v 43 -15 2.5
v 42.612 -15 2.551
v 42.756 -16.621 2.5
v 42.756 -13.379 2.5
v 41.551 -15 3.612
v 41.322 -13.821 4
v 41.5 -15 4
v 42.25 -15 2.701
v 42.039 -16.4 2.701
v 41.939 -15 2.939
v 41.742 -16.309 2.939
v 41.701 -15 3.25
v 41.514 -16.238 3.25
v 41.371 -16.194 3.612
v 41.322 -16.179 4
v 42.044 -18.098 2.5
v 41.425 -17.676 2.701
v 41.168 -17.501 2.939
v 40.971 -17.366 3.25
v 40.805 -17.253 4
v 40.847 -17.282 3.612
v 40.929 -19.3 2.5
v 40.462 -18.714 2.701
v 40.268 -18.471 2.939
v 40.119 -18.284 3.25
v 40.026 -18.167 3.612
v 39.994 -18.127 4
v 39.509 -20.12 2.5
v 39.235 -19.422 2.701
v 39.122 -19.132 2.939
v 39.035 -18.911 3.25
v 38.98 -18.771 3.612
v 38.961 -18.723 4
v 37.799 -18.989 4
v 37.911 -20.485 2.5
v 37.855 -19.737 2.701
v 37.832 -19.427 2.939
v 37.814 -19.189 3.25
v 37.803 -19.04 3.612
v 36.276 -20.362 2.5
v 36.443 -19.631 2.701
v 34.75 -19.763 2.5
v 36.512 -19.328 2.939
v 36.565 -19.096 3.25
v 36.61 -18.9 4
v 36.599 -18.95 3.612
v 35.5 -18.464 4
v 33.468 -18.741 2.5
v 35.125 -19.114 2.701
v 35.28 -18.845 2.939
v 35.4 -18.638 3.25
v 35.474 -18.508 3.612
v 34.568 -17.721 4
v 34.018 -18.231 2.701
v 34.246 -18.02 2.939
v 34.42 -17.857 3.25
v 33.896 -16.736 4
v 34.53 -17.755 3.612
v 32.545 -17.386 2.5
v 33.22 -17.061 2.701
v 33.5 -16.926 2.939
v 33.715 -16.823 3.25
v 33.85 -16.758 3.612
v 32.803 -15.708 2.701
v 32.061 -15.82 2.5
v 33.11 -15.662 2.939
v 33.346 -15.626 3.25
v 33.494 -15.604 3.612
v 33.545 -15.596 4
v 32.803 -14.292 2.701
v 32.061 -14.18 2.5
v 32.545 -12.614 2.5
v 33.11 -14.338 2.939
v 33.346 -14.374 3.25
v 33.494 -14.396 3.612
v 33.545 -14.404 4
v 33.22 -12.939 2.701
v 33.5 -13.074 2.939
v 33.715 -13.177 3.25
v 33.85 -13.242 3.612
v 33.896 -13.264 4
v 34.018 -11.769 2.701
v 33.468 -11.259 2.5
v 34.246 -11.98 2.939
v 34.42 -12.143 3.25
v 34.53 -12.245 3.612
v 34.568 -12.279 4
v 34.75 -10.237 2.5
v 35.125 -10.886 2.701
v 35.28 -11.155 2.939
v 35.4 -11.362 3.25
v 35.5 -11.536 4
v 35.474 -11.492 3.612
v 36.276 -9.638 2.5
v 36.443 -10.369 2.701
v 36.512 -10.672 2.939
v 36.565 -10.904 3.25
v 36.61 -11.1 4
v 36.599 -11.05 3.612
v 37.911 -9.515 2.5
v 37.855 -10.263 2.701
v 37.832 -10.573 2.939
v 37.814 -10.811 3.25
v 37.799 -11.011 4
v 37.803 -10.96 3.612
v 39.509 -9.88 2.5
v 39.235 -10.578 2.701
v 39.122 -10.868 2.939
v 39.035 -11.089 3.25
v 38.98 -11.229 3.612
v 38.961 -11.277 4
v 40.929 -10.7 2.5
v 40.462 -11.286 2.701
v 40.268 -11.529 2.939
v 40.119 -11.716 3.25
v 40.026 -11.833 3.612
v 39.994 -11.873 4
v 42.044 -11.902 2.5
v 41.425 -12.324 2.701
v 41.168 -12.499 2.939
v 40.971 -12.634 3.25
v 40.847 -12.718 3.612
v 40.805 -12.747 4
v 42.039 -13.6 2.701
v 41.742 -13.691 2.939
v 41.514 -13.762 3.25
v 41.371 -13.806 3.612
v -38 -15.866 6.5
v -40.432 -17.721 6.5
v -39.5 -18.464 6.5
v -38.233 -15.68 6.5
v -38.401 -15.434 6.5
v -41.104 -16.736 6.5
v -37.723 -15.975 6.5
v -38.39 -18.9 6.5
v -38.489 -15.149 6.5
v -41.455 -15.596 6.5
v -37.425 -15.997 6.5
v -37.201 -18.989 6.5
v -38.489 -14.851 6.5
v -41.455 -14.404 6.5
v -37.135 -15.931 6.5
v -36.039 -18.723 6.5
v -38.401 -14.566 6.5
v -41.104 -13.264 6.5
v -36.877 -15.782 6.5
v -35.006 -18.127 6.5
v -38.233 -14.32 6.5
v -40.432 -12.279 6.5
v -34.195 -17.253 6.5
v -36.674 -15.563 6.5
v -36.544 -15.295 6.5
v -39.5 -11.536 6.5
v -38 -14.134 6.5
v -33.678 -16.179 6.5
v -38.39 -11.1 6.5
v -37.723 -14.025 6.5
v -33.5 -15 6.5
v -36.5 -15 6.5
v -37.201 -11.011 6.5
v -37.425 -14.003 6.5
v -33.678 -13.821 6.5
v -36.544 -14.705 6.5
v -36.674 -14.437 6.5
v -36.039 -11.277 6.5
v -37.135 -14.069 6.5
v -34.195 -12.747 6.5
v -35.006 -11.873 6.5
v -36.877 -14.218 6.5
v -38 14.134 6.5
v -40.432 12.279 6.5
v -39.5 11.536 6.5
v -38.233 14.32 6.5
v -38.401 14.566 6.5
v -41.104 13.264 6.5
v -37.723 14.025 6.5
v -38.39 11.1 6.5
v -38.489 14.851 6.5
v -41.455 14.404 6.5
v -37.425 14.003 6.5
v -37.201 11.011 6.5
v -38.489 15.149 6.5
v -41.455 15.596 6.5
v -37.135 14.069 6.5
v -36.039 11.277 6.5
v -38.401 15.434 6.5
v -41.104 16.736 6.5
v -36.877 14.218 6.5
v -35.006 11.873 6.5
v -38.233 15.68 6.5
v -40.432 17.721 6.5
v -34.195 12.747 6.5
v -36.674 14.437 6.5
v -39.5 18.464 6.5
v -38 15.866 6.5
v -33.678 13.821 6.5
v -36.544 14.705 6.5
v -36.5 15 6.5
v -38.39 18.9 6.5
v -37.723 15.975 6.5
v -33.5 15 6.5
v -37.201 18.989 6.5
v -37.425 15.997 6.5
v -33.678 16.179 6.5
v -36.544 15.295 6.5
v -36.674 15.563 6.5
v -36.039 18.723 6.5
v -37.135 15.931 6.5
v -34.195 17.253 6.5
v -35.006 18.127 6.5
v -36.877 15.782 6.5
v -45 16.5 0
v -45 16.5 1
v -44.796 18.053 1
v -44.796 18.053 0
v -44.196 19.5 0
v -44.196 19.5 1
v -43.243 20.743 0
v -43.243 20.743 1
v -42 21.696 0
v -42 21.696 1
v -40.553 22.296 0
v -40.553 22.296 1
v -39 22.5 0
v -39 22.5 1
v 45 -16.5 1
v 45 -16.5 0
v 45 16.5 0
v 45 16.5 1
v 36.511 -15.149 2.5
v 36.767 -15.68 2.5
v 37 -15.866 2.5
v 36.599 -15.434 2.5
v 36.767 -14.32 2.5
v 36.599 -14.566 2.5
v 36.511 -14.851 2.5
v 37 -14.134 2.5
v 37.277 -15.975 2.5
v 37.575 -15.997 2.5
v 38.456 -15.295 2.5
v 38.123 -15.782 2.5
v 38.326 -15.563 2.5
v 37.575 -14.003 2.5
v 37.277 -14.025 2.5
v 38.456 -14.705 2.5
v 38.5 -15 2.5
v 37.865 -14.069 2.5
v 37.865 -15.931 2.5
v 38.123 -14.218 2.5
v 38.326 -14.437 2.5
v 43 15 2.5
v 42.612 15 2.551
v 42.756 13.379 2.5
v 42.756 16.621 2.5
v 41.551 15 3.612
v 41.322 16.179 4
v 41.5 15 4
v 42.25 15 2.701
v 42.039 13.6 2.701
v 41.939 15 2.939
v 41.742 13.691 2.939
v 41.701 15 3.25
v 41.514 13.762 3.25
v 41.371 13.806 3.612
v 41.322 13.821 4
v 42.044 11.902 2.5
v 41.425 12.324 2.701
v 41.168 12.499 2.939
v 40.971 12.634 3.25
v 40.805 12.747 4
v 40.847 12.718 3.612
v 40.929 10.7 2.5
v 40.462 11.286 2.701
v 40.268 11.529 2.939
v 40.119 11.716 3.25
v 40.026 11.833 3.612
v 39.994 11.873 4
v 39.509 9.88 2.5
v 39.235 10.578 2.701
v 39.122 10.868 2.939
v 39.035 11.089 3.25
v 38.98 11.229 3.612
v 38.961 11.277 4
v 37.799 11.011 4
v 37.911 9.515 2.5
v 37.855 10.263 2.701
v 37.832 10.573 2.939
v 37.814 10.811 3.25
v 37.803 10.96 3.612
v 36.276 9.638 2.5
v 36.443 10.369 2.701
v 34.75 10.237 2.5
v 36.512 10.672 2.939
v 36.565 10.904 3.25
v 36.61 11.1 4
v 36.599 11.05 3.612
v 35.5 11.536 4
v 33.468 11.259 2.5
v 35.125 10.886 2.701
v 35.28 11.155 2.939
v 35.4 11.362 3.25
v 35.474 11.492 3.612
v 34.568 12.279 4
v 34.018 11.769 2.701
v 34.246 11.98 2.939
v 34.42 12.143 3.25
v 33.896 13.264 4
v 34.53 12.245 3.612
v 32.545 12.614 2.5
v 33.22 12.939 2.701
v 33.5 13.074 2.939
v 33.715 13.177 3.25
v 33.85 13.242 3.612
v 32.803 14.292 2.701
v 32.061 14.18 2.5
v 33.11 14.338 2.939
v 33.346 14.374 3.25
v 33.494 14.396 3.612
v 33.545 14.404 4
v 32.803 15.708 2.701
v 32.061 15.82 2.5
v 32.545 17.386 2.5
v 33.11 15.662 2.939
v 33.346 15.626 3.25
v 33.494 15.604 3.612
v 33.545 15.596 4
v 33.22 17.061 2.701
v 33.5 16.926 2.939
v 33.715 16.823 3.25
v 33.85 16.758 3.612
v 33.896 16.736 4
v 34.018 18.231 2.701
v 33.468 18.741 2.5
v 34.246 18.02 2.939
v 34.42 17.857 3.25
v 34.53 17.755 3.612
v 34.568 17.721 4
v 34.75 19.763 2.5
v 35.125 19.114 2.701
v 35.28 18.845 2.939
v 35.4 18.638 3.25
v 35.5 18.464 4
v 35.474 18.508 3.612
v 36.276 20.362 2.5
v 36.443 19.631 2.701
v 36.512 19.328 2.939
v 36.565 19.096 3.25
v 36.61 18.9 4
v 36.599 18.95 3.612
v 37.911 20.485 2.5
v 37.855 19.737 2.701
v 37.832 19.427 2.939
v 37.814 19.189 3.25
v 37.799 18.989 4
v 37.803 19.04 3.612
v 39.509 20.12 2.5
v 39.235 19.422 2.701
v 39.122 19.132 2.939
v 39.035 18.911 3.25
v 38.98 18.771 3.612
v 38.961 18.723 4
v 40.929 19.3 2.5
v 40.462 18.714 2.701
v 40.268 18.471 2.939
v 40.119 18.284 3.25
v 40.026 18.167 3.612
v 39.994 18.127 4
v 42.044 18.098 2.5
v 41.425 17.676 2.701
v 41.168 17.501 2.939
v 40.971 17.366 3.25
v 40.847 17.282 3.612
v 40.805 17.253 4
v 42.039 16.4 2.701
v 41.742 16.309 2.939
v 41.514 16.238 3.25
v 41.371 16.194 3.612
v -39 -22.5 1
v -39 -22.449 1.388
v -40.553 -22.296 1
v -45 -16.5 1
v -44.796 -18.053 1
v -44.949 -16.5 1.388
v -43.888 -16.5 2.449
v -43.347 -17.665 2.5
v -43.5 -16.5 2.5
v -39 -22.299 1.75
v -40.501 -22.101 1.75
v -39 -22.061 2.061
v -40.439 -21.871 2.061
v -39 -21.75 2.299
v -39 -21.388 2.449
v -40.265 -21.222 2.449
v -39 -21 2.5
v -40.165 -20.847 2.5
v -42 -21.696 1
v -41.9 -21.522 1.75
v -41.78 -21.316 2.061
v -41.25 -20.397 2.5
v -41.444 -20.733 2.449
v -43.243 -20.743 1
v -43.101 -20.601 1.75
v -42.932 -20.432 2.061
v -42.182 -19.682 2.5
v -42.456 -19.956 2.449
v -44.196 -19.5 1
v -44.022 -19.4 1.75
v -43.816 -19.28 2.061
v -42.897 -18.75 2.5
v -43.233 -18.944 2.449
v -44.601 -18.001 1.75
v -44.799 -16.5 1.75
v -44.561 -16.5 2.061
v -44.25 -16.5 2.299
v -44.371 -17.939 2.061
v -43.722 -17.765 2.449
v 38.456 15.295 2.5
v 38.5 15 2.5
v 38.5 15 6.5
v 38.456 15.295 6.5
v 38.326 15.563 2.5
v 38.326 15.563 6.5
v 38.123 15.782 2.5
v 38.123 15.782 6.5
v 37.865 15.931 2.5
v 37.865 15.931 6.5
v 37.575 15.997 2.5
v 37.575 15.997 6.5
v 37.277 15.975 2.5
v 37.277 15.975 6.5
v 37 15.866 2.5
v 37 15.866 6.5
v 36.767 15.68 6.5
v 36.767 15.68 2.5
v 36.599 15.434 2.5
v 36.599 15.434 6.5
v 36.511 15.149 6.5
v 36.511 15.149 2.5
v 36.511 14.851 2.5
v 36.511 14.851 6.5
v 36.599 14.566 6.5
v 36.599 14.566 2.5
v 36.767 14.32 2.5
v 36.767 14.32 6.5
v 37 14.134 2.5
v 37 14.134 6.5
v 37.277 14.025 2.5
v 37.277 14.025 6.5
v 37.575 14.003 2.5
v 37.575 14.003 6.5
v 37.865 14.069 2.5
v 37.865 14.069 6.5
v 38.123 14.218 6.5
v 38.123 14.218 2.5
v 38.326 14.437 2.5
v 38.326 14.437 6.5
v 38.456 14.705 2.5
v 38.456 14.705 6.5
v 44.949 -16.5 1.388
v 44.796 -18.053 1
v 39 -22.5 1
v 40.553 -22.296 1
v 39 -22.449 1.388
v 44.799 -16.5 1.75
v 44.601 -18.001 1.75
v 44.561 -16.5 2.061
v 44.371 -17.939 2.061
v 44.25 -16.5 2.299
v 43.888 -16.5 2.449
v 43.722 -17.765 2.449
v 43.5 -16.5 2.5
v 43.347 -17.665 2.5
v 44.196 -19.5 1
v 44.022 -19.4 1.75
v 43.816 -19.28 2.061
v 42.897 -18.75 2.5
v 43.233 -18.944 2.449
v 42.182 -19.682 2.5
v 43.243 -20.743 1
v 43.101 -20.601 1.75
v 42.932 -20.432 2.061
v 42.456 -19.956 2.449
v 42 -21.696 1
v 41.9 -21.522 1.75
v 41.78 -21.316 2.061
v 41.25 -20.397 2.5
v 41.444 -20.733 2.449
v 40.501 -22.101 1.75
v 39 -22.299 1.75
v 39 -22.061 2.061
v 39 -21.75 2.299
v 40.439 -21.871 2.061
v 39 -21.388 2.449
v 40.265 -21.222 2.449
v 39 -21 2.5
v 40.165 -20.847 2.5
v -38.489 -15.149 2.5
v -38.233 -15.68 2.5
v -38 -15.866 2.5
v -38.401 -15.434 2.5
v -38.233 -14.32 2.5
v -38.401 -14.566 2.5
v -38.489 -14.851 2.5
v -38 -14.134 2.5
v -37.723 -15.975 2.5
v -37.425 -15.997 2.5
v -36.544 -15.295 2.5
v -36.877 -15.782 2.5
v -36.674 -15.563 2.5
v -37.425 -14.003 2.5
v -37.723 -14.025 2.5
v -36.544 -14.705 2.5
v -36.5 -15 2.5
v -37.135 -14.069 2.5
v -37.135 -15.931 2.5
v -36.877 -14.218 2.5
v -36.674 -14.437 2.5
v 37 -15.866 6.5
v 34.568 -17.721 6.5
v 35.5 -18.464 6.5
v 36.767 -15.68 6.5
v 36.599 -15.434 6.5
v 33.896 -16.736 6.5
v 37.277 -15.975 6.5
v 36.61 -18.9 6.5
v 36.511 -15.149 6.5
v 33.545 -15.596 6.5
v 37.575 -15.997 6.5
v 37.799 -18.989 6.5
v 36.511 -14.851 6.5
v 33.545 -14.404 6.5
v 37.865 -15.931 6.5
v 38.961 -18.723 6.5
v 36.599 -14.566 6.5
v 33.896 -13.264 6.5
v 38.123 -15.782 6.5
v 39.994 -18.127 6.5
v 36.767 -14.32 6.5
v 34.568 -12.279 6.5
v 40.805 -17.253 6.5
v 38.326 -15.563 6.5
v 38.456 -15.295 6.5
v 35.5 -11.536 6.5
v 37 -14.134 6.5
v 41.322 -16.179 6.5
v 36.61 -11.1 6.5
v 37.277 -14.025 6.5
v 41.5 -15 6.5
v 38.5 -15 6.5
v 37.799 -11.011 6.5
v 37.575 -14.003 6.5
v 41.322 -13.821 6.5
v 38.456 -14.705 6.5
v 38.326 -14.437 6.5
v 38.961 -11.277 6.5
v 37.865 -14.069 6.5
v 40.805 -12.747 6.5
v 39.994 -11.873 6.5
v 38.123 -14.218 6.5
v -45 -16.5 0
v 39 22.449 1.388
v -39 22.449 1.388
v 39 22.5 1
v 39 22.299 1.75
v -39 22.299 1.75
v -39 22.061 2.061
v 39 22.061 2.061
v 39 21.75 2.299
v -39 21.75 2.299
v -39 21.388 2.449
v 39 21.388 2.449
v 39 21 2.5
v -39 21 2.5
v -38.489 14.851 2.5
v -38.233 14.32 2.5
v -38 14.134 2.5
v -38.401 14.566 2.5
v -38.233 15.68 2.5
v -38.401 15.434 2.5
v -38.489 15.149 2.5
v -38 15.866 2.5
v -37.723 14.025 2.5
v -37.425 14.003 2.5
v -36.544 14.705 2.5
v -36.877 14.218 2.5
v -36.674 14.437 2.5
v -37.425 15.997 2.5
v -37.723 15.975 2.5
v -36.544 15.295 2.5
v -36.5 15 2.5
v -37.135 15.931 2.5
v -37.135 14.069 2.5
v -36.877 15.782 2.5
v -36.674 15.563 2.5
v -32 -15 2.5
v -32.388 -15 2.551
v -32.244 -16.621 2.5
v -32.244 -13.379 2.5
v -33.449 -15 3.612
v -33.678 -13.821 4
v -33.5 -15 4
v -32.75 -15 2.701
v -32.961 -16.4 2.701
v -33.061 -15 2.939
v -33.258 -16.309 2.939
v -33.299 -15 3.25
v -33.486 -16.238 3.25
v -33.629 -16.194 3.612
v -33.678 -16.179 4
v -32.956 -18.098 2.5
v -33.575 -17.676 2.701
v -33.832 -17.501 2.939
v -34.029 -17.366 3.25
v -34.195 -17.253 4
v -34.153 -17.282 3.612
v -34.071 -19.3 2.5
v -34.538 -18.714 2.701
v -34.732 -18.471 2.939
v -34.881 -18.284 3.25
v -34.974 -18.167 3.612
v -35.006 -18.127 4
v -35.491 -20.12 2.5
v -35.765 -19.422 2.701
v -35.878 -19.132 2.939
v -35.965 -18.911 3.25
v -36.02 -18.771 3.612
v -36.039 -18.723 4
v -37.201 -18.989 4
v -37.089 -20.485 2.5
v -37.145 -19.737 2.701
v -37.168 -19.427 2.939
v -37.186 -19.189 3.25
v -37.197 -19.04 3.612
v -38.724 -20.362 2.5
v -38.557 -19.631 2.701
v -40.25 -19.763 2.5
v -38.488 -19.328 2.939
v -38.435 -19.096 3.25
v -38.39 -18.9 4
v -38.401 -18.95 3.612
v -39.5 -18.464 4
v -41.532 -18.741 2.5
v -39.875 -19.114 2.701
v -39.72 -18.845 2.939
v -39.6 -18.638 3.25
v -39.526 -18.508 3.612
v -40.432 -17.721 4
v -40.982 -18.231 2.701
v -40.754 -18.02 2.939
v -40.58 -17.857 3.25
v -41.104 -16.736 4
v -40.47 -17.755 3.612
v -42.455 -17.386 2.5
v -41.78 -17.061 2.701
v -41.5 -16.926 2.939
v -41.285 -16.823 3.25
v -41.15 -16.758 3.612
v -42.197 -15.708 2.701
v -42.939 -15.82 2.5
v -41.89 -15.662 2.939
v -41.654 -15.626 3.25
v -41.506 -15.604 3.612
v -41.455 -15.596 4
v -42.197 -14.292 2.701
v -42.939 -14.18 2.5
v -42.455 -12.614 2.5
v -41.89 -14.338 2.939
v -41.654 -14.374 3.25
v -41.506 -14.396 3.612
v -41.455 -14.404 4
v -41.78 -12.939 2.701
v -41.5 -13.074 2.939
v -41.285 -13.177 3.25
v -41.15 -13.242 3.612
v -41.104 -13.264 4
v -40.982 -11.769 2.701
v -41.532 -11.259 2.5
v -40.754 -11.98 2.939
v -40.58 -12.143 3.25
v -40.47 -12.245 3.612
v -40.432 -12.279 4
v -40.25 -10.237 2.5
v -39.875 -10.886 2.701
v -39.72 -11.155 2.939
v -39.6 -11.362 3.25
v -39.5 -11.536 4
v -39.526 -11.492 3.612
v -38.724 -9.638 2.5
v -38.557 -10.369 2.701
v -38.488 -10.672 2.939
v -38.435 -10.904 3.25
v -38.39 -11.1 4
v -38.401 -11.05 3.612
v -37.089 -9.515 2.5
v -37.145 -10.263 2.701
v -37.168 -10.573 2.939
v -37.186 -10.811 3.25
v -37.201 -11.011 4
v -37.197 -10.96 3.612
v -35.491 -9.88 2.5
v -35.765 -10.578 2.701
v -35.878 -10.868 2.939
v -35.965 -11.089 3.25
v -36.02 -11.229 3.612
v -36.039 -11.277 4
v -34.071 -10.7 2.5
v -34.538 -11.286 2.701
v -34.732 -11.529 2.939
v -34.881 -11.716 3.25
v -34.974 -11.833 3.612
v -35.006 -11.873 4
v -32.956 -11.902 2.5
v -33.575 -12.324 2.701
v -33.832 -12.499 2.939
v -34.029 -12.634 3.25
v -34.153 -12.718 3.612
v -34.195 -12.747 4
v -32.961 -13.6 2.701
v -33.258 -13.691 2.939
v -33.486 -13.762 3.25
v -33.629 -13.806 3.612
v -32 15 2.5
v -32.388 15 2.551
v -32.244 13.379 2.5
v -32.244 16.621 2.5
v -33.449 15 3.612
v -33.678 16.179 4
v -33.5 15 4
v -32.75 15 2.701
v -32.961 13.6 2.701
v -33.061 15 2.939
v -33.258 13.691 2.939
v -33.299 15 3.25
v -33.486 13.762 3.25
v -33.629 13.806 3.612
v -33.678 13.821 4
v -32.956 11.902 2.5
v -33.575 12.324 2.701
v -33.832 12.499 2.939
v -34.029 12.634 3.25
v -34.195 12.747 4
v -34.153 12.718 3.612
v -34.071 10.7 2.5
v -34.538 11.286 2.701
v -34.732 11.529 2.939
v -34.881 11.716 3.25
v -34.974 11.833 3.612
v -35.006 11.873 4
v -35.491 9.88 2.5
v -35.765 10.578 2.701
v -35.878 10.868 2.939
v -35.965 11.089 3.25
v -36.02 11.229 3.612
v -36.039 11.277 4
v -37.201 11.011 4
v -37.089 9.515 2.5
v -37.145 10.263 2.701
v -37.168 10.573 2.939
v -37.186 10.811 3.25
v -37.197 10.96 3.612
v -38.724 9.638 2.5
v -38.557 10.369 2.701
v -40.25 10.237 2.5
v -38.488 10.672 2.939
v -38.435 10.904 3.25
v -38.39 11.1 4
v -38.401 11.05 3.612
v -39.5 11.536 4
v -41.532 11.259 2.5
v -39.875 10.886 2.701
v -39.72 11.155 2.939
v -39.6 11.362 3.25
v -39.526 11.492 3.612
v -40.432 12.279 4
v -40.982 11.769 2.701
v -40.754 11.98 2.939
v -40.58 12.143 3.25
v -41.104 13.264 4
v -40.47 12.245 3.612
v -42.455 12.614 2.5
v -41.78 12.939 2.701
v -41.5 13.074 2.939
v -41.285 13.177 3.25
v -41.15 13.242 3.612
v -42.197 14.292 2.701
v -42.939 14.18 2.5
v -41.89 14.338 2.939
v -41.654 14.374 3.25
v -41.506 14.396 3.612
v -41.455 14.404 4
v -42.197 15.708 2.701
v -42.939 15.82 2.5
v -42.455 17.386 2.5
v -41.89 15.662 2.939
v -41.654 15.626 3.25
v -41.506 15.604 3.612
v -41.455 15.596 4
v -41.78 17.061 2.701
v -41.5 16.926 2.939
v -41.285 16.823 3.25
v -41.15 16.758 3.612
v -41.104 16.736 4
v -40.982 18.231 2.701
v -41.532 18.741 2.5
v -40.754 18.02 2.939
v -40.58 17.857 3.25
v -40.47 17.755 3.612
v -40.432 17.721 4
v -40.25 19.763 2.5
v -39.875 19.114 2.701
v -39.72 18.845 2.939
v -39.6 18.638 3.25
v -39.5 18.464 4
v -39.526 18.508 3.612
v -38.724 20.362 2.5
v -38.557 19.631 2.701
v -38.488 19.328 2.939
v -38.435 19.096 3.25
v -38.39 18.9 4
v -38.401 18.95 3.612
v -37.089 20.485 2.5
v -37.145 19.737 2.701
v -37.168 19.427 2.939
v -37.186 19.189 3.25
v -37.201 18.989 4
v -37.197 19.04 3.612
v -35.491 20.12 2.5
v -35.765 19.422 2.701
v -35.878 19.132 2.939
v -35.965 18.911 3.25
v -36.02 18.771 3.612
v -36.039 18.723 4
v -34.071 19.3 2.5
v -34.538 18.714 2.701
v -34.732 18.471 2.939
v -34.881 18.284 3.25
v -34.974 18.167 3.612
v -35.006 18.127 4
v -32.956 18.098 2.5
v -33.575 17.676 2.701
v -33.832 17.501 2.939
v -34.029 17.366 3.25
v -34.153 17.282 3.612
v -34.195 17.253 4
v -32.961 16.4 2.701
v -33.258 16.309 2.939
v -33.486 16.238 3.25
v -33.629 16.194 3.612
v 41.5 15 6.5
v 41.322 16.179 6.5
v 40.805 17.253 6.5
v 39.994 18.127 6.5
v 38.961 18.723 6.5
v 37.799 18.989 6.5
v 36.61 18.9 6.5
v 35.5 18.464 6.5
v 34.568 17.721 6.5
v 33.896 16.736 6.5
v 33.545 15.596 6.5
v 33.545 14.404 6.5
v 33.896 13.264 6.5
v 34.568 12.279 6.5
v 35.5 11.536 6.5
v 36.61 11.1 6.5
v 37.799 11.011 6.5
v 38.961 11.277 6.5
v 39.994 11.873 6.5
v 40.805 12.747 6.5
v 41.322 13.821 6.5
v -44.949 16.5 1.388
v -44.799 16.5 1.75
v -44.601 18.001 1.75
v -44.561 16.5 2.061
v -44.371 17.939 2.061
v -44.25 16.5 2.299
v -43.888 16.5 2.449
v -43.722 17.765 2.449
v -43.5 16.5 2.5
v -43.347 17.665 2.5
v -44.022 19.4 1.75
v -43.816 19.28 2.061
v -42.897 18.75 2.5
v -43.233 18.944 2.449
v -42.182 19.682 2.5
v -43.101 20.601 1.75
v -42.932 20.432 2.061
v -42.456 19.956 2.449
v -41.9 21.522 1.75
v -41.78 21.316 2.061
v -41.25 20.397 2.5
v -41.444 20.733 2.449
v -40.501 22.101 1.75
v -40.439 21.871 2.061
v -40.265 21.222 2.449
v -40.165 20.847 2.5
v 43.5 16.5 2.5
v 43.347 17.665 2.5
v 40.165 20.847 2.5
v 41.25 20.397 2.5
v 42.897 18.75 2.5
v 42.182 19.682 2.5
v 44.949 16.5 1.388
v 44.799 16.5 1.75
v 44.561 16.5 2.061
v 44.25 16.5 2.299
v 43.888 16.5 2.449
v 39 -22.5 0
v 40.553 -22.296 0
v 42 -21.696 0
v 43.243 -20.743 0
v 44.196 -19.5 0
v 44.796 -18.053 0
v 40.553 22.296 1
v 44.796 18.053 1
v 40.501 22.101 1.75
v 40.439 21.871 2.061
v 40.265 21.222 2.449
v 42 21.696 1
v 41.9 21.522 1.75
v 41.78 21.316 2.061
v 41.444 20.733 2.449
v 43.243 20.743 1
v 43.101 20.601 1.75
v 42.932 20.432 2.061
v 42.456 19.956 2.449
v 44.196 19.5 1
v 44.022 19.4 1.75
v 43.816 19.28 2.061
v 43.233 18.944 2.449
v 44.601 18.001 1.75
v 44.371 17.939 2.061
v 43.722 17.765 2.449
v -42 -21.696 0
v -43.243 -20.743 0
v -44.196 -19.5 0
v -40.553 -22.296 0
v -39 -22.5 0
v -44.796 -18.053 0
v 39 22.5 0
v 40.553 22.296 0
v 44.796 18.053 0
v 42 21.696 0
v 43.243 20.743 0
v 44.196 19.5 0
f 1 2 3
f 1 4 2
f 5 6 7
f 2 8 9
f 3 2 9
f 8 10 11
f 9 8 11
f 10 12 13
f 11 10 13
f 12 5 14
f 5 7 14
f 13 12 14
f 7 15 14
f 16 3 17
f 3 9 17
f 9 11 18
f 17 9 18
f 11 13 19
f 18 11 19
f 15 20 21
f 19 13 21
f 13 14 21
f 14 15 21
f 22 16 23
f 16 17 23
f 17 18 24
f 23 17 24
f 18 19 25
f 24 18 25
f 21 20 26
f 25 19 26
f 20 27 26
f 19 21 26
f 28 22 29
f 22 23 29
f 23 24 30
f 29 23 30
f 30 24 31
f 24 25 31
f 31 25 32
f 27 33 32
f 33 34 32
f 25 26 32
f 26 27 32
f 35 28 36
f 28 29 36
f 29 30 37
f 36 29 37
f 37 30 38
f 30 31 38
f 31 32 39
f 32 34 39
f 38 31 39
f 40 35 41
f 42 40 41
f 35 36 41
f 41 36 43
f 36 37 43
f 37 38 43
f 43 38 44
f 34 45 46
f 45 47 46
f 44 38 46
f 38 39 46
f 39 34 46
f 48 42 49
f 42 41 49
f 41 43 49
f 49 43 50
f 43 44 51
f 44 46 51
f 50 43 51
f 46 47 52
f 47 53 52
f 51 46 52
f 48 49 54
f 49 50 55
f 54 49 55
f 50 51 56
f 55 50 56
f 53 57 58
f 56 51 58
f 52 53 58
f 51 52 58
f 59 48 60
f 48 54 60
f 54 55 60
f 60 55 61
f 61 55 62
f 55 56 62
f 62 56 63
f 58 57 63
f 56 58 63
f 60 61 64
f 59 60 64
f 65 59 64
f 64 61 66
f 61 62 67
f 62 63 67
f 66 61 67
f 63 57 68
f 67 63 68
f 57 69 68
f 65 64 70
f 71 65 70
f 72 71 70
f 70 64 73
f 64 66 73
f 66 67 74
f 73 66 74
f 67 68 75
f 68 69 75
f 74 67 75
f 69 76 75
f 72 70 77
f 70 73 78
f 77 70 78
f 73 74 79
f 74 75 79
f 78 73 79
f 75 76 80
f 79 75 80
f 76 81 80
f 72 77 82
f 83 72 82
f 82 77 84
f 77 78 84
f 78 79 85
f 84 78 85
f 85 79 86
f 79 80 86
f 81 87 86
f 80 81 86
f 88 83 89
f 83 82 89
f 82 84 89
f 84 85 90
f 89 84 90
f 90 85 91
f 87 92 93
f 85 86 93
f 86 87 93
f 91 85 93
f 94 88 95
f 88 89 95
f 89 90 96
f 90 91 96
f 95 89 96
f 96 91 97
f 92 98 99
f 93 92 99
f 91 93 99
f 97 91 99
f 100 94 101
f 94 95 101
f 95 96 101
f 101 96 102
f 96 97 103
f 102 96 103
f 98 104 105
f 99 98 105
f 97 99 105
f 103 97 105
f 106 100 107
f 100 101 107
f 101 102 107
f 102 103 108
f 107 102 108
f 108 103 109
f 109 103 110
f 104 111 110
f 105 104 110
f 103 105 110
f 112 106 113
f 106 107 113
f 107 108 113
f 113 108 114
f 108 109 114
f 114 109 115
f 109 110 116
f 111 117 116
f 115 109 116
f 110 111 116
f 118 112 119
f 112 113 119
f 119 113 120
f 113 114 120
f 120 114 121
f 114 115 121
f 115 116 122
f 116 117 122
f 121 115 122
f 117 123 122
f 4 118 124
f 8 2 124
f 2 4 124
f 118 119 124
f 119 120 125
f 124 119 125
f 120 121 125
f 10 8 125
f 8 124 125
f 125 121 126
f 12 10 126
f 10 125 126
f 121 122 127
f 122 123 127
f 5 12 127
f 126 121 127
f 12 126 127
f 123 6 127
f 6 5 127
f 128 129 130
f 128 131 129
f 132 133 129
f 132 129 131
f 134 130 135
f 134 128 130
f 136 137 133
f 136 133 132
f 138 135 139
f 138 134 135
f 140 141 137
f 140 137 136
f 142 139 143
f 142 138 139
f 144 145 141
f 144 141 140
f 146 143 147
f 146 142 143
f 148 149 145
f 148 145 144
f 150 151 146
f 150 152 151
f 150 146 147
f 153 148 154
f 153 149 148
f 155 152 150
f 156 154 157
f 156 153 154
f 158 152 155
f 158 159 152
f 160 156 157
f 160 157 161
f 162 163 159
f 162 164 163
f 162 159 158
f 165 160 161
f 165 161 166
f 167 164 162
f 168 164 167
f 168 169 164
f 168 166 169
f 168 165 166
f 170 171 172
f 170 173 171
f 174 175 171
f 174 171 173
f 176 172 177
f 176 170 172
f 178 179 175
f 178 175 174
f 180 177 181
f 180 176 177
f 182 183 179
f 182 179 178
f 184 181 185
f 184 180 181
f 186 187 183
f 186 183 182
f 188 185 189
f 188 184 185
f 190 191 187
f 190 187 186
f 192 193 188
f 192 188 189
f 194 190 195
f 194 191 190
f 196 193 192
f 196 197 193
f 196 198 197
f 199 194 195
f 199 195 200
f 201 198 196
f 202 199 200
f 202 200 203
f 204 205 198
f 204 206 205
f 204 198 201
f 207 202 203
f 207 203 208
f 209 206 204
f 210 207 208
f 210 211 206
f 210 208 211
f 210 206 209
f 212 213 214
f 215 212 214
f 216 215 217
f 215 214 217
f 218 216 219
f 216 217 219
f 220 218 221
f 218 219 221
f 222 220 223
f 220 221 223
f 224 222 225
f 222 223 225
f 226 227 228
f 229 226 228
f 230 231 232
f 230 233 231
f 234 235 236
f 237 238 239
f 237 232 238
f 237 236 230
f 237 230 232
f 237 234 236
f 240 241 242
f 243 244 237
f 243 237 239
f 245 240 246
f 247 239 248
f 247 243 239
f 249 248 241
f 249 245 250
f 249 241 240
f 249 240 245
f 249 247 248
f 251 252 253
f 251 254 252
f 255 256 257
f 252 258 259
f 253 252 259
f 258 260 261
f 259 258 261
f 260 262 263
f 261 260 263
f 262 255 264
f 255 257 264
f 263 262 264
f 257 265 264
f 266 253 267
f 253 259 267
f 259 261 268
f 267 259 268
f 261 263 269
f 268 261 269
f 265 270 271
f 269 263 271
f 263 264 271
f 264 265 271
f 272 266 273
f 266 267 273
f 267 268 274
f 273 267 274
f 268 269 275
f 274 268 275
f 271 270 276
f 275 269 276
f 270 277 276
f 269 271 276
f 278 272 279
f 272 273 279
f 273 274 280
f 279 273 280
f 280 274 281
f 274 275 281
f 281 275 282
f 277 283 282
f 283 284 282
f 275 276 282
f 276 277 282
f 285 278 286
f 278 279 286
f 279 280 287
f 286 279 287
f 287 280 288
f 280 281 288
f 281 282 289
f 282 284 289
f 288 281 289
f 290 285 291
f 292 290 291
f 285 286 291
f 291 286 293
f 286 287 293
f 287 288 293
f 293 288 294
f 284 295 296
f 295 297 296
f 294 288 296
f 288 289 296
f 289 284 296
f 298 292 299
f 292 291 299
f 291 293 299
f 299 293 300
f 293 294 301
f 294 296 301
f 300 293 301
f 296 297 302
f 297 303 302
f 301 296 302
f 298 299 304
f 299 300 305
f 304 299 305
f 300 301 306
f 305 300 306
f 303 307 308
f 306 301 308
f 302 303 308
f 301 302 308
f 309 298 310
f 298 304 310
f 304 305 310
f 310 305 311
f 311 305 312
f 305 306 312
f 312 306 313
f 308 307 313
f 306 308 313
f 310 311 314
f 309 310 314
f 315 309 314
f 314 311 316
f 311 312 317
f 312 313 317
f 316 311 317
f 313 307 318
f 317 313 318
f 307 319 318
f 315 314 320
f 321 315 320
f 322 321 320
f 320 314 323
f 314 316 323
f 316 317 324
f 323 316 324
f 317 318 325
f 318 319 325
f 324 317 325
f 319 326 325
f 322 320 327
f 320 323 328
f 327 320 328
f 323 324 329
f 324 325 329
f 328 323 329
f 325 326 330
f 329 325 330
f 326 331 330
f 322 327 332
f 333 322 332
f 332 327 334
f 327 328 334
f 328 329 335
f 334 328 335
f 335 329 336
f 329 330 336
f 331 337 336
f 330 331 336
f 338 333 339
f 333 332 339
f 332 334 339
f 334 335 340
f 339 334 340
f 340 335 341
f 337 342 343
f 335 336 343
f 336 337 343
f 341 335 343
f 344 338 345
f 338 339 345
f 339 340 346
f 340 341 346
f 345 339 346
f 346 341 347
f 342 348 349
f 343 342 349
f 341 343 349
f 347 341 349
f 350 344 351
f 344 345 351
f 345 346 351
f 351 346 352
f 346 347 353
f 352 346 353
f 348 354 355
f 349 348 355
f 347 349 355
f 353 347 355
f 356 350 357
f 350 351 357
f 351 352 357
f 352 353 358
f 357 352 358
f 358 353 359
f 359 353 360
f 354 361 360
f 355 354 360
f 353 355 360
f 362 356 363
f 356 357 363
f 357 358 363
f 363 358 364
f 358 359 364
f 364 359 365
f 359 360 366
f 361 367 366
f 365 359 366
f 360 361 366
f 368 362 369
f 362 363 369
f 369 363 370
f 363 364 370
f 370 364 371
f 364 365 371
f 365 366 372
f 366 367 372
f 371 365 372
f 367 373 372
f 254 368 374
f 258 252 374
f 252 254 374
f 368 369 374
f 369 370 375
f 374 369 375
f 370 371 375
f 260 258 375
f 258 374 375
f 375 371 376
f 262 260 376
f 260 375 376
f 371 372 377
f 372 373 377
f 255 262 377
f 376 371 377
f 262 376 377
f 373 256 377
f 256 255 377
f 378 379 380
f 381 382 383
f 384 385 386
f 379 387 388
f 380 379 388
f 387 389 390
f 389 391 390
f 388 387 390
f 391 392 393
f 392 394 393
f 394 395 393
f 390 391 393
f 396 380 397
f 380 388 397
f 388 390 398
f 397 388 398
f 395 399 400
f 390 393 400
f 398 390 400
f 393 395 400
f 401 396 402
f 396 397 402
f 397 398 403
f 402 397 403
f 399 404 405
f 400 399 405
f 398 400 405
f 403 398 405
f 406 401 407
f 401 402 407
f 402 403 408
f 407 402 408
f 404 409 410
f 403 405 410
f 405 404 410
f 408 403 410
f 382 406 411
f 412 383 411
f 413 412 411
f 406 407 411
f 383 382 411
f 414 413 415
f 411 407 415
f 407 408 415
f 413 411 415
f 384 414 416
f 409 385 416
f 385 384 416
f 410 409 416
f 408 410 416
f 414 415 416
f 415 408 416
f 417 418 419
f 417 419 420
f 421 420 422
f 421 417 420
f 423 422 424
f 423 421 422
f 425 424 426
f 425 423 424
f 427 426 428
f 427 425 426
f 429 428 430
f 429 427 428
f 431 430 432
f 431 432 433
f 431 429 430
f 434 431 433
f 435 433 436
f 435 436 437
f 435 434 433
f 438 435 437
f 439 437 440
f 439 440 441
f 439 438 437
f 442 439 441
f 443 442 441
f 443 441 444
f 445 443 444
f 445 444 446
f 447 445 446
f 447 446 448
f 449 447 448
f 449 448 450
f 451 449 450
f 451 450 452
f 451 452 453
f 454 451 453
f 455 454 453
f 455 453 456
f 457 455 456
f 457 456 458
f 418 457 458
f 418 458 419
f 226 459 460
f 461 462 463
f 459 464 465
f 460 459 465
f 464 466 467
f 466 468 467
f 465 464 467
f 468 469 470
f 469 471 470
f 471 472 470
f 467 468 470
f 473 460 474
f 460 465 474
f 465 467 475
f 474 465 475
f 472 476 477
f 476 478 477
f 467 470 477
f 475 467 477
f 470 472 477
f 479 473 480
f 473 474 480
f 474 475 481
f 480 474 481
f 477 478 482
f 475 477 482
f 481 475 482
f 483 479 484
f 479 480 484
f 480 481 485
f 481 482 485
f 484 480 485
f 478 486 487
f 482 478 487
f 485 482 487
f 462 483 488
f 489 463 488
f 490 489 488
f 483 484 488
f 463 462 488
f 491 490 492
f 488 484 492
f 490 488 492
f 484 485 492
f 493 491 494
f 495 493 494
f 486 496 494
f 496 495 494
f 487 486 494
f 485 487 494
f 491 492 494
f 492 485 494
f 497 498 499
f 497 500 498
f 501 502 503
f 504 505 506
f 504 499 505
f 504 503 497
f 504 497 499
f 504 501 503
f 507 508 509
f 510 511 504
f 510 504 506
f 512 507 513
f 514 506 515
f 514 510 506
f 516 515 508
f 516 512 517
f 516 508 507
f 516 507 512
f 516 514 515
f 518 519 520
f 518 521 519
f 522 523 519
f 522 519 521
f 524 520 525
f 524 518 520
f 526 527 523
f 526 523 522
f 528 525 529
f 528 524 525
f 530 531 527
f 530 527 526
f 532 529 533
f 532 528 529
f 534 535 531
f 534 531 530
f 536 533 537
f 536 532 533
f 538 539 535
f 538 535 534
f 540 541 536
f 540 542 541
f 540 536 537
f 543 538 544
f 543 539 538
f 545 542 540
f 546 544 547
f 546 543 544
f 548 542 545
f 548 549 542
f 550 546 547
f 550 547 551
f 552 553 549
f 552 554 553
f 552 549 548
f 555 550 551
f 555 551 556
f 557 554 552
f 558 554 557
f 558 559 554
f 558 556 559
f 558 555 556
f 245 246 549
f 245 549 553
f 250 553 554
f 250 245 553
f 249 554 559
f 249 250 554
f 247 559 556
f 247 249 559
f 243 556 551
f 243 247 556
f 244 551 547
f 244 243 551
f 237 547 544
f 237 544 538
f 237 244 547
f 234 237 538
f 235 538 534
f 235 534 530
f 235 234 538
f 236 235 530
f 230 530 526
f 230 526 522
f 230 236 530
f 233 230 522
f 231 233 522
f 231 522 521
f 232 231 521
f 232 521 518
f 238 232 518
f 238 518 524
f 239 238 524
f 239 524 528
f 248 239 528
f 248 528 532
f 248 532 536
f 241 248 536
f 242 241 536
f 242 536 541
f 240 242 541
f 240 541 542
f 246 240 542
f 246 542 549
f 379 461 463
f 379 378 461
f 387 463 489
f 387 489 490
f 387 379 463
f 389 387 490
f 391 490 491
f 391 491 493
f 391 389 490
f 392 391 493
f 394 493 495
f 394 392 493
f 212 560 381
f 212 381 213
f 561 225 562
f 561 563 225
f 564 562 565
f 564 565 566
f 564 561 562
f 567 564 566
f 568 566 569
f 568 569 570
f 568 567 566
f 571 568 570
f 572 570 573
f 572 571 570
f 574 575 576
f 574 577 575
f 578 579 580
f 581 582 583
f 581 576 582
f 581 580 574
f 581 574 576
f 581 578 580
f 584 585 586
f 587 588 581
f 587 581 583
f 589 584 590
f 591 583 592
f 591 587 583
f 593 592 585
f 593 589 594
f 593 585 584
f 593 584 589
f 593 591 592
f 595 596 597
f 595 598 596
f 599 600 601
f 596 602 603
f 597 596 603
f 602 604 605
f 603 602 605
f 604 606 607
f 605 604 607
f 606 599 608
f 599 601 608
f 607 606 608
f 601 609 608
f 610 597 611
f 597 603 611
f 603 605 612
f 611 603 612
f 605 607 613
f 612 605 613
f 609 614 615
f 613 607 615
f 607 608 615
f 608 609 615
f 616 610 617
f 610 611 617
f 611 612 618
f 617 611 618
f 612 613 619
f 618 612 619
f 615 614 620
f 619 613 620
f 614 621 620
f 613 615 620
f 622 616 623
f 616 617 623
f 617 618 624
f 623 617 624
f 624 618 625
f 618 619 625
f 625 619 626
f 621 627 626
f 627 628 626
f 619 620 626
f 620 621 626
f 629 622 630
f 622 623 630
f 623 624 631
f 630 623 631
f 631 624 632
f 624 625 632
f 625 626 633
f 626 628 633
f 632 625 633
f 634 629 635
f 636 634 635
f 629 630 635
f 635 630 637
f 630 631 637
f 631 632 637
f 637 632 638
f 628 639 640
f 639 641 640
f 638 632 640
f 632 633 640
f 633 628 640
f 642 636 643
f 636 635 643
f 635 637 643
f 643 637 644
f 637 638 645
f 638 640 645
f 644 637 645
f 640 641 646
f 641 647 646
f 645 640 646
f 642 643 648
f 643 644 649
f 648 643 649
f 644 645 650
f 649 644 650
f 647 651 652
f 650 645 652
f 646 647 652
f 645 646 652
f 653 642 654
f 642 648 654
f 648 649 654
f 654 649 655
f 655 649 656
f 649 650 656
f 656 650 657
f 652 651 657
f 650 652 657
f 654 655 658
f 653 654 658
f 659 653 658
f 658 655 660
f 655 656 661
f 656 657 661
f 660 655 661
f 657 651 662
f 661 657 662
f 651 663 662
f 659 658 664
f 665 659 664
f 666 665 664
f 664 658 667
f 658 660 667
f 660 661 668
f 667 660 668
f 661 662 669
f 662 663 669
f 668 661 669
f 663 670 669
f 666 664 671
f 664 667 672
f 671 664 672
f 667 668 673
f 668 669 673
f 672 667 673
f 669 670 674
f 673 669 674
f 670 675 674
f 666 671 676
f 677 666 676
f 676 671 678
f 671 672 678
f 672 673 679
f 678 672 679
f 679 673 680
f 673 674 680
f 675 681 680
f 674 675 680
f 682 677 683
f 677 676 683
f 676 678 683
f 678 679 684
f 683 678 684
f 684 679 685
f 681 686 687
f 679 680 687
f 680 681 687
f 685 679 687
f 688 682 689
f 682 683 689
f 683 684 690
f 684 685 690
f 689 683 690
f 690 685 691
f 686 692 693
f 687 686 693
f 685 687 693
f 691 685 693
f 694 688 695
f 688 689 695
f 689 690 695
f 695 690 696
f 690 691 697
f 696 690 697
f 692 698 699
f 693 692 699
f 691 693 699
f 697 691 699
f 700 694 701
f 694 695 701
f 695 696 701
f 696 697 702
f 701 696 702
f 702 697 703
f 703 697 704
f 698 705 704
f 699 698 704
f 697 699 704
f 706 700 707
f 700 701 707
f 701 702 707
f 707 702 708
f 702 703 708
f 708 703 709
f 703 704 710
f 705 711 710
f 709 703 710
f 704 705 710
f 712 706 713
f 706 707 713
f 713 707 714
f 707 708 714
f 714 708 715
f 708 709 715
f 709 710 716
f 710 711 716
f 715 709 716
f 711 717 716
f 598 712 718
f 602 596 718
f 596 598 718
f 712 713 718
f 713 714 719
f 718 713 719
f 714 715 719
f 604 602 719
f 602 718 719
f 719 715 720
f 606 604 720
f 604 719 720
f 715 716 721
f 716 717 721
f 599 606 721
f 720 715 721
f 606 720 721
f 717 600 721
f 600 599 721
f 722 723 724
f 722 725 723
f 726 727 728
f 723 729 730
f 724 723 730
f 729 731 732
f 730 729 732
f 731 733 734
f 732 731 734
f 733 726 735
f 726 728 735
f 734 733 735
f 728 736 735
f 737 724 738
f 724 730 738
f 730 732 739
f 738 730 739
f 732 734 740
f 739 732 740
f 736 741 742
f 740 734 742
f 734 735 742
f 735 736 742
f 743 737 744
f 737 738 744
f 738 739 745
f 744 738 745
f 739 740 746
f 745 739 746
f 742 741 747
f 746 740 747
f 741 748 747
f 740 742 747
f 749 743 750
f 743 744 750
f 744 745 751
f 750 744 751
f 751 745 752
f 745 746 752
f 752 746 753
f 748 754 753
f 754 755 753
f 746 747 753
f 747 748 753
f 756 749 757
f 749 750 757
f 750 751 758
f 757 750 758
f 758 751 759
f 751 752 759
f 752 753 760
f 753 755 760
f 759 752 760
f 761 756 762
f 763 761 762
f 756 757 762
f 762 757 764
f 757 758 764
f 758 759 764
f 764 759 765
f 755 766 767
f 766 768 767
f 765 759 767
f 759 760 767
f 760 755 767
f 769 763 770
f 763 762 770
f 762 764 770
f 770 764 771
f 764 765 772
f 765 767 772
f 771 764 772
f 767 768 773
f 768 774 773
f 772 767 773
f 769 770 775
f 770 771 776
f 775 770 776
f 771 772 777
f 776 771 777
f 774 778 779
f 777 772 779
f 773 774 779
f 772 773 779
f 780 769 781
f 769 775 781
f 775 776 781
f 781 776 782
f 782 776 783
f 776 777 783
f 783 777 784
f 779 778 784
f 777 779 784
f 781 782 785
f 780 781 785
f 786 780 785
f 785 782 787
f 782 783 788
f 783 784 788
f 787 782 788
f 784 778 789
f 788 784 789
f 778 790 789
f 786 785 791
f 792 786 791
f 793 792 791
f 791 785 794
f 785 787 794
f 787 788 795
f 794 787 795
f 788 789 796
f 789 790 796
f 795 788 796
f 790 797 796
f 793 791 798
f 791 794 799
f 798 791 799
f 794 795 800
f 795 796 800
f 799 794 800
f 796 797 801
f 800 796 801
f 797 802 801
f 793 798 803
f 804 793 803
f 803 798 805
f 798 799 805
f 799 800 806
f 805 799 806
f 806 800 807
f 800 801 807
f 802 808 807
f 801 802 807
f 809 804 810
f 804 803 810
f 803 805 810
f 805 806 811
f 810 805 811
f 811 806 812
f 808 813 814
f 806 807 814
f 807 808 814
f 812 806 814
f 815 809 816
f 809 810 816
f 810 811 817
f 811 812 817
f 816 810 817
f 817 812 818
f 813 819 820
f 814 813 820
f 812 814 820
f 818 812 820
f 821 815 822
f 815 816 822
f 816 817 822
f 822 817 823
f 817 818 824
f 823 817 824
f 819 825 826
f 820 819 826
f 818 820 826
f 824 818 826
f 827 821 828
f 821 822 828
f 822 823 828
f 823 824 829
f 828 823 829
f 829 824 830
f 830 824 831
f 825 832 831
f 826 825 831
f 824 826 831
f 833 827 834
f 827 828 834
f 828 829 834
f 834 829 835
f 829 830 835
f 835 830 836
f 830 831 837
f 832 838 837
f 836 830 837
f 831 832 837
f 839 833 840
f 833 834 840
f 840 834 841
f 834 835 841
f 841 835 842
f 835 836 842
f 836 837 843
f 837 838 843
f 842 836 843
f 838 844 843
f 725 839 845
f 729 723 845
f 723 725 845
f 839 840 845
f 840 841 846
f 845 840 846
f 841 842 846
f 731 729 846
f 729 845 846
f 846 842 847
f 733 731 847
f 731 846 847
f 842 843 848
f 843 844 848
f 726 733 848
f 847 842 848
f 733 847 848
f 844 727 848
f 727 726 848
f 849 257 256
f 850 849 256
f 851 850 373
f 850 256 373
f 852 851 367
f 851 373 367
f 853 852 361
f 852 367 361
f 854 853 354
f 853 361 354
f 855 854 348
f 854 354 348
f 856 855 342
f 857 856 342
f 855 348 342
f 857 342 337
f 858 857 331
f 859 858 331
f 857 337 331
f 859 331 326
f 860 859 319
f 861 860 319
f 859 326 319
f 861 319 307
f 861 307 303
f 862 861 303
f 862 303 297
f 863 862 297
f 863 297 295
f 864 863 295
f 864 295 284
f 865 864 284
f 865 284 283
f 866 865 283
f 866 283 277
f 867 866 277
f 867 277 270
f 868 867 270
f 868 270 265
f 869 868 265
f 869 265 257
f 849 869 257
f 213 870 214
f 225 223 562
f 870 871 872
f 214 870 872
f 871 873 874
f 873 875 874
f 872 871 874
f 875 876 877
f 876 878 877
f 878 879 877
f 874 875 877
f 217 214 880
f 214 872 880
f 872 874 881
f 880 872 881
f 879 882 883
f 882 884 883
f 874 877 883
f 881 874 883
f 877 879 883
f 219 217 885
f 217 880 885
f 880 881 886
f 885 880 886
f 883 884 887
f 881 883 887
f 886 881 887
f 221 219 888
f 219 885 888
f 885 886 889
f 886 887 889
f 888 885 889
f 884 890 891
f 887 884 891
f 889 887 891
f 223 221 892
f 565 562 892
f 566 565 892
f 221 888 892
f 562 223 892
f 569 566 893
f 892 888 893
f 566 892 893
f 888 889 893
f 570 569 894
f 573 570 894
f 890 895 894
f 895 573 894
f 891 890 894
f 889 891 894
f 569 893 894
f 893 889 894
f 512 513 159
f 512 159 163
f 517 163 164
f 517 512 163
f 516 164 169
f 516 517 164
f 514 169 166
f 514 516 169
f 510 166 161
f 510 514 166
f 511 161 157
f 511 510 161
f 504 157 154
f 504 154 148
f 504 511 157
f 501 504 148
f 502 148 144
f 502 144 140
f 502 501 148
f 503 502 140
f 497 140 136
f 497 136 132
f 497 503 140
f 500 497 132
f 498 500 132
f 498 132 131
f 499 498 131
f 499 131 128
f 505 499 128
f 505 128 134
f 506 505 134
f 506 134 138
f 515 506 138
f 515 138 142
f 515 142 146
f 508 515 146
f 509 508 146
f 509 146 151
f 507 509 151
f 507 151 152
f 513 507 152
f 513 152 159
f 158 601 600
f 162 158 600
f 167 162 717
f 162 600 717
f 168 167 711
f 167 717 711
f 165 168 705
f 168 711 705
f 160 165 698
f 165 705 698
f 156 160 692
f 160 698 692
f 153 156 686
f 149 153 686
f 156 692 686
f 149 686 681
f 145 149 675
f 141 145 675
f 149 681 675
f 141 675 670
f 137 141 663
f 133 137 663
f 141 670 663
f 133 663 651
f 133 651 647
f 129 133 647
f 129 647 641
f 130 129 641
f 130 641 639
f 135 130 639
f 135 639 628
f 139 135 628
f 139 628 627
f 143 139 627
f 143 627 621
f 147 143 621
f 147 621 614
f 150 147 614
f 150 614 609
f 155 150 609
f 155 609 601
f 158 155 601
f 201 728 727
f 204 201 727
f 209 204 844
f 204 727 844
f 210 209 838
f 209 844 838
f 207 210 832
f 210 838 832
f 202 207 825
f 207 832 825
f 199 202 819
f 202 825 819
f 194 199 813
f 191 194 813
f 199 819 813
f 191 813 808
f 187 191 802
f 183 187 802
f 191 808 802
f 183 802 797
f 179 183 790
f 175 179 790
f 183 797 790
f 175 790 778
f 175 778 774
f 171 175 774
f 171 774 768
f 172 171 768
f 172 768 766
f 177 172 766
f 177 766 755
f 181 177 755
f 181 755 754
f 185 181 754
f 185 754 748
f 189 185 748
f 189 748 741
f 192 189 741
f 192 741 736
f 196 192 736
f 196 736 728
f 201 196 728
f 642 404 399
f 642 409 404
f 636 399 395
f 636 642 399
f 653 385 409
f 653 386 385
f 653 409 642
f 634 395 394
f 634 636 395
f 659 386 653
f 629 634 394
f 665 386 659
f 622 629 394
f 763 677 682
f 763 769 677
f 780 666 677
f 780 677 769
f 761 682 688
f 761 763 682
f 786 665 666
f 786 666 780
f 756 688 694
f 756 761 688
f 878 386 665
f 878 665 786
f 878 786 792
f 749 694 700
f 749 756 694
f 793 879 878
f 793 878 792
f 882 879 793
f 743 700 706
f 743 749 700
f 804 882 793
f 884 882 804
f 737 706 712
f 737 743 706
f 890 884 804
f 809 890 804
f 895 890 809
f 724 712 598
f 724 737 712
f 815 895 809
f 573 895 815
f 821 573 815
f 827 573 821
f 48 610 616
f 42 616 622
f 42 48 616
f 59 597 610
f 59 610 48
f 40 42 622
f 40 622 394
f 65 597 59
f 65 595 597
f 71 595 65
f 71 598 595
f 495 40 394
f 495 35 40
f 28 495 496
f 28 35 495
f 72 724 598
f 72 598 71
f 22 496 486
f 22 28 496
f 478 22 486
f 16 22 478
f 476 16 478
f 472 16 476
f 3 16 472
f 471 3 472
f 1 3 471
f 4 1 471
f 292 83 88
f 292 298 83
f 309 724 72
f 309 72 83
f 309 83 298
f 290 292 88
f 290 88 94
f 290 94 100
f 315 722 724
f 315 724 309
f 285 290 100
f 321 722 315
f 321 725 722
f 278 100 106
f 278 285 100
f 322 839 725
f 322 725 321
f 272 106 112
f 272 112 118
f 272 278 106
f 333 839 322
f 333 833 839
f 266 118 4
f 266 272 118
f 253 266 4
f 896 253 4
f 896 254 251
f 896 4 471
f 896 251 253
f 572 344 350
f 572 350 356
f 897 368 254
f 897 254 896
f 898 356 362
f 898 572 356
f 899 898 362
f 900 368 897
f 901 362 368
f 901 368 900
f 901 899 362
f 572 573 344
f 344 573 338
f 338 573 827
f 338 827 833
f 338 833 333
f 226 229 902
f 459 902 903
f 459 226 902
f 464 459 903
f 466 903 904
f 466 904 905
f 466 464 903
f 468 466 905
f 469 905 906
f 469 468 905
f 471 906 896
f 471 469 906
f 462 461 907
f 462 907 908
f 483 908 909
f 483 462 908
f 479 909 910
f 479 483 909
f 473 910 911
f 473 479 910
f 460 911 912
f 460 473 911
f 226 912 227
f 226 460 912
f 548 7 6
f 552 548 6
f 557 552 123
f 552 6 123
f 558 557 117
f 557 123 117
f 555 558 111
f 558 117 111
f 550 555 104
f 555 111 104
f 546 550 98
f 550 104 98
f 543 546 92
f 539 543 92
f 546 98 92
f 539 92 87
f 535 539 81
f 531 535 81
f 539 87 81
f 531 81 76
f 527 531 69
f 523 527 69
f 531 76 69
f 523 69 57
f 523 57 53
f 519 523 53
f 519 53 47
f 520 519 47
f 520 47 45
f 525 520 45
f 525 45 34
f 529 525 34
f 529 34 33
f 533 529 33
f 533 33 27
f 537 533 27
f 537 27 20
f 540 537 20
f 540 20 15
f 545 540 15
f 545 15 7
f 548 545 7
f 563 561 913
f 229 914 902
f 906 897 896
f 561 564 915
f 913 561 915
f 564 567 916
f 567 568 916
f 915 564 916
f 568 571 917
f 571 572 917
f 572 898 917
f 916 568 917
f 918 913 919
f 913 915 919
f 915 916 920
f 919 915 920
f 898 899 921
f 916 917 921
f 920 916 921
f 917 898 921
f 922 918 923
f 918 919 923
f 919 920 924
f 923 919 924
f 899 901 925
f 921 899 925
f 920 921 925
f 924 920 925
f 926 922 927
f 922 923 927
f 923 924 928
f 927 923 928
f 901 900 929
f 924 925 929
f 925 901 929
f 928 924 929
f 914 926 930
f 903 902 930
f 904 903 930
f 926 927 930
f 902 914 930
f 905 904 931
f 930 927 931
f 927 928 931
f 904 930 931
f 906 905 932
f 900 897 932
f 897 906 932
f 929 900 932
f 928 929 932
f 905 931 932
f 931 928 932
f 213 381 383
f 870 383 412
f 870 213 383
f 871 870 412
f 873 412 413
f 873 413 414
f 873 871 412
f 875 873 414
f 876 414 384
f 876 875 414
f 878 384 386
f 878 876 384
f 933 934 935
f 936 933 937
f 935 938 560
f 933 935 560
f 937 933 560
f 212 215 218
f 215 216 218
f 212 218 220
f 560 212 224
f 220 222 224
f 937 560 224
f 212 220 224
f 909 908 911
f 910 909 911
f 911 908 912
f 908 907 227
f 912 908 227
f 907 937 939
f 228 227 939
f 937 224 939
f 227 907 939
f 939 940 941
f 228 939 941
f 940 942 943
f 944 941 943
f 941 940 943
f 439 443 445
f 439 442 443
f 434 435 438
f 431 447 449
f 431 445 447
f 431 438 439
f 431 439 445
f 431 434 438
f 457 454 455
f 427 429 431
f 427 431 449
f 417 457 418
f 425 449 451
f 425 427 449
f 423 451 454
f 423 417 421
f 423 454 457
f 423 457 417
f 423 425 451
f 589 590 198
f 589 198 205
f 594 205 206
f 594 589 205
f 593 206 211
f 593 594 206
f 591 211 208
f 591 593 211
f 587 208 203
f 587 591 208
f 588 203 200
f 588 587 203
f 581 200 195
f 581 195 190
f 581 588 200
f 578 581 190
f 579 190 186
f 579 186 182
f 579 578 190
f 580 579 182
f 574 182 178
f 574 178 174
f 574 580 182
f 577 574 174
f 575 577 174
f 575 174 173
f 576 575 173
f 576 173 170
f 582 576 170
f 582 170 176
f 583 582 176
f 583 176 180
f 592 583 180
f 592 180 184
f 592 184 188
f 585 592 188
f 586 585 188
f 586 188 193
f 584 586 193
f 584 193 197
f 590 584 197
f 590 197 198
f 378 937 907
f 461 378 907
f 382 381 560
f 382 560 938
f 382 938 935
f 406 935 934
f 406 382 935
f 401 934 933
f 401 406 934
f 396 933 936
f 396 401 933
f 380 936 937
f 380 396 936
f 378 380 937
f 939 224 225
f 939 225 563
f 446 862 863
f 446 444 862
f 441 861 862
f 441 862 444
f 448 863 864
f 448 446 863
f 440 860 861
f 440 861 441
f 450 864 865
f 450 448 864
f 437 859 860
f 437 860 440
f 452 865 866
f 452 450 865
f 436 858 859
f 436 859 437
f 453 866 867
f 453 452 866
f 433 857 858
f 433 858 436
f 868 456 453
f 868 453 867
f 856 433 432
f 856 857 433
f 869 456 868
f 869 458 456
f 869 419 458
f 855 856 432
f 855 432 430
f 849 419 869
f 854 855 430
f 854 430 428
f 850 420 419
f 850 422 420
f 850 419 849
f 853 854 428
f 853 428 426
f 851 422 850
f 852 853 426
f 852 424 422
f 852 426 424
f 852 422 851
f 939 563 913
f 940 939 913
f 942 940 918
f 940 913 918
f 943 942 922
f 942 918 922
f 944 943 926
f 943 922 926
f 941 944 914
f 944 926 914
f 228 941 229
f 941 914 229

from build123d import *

# Parameters (mm, degrees)
SKETCH001_W  = 90
SKETCH001_H  = 45
PAD_DEPTH    = 2.5
SKETCH_R     = 4
SKETCH_R_2   = 1
PAD001_DEPTH = 6.5
FILLET_R     = 6
FILLET001_R  = 1.5


with BuildPart() as part:
    # Sketch001 → Pad (new body)
    with BuildSketch(Plane.XY):
        Rectangle(SKETCH001_W, SKETCH001_H)
    extrude(amount=PAD_DEPTH)

    # Sketch → Pad001 (join)
    with BuildSketch(Plane.XY):
        with Locations((-37.5, 15)):
            Circle(SKETCH_R)
        with Locations((-37.5, 15)):
            Circle(SKETCH_R_2, mode=Mode.SUBTRACT)
        with Locations((37.5, 15)):
            Circle(SKETCH_R)
        with Locations((37.5, 15)):
            Circle(SKETCH_R_2, mode=Mode.SUBTRACT)
        with Locations((37.5, -15)):
            Circle(SKETCH_R)
        with Locations((37.5, -15)):
            Circle(SKETCH_R_2, mode=Mode.SUBTRACT)
        with Locations((-37.5, -15)):
            Circle(SKETCH_R)
        with Locations((-37.5, -15)):
            Circle(SKETCH_R_2, mode=Mode.SUBTRACT)
    extrude(amount=PAD001_DEPTH)

    # Fillet
    fillet_edges = [part.edges().sort_by_distance(p)[0] for p in [
        (45, -22.5, 1.25),
        (45, 22.5, 1.25),
        (-45, 22.5, 1.25),
        (-45, -22.5, 1.25),
    ]]
    fillet(fillet_edges, radius=FILLET_R)

    # Fillet001
    fillet001_edges = [part.edges().sort_by_distance(p)[0] for p in [
        (-45, 0, 2.5),
        (-43.242641, 20.742641, 2.5),
        (-43.242641, -20.742641, 2.5),
        (0, 22.5, 2.5),
        (0, -22.5, 2.5),
        (43.242641, 20.742641, 2.5),
        (43.242641, -20.742641, 2.5),
        (45, 0, 2.5),
        (-41.5, -15, 2.5),
        (33.5, -15, 2.5),
        (-41.5, 15, 2.5),
        (33.5, 15, 2.5),
    ]]
    fillet(fillet001_edges, radius=FILLET001_R)


solid = part.part
